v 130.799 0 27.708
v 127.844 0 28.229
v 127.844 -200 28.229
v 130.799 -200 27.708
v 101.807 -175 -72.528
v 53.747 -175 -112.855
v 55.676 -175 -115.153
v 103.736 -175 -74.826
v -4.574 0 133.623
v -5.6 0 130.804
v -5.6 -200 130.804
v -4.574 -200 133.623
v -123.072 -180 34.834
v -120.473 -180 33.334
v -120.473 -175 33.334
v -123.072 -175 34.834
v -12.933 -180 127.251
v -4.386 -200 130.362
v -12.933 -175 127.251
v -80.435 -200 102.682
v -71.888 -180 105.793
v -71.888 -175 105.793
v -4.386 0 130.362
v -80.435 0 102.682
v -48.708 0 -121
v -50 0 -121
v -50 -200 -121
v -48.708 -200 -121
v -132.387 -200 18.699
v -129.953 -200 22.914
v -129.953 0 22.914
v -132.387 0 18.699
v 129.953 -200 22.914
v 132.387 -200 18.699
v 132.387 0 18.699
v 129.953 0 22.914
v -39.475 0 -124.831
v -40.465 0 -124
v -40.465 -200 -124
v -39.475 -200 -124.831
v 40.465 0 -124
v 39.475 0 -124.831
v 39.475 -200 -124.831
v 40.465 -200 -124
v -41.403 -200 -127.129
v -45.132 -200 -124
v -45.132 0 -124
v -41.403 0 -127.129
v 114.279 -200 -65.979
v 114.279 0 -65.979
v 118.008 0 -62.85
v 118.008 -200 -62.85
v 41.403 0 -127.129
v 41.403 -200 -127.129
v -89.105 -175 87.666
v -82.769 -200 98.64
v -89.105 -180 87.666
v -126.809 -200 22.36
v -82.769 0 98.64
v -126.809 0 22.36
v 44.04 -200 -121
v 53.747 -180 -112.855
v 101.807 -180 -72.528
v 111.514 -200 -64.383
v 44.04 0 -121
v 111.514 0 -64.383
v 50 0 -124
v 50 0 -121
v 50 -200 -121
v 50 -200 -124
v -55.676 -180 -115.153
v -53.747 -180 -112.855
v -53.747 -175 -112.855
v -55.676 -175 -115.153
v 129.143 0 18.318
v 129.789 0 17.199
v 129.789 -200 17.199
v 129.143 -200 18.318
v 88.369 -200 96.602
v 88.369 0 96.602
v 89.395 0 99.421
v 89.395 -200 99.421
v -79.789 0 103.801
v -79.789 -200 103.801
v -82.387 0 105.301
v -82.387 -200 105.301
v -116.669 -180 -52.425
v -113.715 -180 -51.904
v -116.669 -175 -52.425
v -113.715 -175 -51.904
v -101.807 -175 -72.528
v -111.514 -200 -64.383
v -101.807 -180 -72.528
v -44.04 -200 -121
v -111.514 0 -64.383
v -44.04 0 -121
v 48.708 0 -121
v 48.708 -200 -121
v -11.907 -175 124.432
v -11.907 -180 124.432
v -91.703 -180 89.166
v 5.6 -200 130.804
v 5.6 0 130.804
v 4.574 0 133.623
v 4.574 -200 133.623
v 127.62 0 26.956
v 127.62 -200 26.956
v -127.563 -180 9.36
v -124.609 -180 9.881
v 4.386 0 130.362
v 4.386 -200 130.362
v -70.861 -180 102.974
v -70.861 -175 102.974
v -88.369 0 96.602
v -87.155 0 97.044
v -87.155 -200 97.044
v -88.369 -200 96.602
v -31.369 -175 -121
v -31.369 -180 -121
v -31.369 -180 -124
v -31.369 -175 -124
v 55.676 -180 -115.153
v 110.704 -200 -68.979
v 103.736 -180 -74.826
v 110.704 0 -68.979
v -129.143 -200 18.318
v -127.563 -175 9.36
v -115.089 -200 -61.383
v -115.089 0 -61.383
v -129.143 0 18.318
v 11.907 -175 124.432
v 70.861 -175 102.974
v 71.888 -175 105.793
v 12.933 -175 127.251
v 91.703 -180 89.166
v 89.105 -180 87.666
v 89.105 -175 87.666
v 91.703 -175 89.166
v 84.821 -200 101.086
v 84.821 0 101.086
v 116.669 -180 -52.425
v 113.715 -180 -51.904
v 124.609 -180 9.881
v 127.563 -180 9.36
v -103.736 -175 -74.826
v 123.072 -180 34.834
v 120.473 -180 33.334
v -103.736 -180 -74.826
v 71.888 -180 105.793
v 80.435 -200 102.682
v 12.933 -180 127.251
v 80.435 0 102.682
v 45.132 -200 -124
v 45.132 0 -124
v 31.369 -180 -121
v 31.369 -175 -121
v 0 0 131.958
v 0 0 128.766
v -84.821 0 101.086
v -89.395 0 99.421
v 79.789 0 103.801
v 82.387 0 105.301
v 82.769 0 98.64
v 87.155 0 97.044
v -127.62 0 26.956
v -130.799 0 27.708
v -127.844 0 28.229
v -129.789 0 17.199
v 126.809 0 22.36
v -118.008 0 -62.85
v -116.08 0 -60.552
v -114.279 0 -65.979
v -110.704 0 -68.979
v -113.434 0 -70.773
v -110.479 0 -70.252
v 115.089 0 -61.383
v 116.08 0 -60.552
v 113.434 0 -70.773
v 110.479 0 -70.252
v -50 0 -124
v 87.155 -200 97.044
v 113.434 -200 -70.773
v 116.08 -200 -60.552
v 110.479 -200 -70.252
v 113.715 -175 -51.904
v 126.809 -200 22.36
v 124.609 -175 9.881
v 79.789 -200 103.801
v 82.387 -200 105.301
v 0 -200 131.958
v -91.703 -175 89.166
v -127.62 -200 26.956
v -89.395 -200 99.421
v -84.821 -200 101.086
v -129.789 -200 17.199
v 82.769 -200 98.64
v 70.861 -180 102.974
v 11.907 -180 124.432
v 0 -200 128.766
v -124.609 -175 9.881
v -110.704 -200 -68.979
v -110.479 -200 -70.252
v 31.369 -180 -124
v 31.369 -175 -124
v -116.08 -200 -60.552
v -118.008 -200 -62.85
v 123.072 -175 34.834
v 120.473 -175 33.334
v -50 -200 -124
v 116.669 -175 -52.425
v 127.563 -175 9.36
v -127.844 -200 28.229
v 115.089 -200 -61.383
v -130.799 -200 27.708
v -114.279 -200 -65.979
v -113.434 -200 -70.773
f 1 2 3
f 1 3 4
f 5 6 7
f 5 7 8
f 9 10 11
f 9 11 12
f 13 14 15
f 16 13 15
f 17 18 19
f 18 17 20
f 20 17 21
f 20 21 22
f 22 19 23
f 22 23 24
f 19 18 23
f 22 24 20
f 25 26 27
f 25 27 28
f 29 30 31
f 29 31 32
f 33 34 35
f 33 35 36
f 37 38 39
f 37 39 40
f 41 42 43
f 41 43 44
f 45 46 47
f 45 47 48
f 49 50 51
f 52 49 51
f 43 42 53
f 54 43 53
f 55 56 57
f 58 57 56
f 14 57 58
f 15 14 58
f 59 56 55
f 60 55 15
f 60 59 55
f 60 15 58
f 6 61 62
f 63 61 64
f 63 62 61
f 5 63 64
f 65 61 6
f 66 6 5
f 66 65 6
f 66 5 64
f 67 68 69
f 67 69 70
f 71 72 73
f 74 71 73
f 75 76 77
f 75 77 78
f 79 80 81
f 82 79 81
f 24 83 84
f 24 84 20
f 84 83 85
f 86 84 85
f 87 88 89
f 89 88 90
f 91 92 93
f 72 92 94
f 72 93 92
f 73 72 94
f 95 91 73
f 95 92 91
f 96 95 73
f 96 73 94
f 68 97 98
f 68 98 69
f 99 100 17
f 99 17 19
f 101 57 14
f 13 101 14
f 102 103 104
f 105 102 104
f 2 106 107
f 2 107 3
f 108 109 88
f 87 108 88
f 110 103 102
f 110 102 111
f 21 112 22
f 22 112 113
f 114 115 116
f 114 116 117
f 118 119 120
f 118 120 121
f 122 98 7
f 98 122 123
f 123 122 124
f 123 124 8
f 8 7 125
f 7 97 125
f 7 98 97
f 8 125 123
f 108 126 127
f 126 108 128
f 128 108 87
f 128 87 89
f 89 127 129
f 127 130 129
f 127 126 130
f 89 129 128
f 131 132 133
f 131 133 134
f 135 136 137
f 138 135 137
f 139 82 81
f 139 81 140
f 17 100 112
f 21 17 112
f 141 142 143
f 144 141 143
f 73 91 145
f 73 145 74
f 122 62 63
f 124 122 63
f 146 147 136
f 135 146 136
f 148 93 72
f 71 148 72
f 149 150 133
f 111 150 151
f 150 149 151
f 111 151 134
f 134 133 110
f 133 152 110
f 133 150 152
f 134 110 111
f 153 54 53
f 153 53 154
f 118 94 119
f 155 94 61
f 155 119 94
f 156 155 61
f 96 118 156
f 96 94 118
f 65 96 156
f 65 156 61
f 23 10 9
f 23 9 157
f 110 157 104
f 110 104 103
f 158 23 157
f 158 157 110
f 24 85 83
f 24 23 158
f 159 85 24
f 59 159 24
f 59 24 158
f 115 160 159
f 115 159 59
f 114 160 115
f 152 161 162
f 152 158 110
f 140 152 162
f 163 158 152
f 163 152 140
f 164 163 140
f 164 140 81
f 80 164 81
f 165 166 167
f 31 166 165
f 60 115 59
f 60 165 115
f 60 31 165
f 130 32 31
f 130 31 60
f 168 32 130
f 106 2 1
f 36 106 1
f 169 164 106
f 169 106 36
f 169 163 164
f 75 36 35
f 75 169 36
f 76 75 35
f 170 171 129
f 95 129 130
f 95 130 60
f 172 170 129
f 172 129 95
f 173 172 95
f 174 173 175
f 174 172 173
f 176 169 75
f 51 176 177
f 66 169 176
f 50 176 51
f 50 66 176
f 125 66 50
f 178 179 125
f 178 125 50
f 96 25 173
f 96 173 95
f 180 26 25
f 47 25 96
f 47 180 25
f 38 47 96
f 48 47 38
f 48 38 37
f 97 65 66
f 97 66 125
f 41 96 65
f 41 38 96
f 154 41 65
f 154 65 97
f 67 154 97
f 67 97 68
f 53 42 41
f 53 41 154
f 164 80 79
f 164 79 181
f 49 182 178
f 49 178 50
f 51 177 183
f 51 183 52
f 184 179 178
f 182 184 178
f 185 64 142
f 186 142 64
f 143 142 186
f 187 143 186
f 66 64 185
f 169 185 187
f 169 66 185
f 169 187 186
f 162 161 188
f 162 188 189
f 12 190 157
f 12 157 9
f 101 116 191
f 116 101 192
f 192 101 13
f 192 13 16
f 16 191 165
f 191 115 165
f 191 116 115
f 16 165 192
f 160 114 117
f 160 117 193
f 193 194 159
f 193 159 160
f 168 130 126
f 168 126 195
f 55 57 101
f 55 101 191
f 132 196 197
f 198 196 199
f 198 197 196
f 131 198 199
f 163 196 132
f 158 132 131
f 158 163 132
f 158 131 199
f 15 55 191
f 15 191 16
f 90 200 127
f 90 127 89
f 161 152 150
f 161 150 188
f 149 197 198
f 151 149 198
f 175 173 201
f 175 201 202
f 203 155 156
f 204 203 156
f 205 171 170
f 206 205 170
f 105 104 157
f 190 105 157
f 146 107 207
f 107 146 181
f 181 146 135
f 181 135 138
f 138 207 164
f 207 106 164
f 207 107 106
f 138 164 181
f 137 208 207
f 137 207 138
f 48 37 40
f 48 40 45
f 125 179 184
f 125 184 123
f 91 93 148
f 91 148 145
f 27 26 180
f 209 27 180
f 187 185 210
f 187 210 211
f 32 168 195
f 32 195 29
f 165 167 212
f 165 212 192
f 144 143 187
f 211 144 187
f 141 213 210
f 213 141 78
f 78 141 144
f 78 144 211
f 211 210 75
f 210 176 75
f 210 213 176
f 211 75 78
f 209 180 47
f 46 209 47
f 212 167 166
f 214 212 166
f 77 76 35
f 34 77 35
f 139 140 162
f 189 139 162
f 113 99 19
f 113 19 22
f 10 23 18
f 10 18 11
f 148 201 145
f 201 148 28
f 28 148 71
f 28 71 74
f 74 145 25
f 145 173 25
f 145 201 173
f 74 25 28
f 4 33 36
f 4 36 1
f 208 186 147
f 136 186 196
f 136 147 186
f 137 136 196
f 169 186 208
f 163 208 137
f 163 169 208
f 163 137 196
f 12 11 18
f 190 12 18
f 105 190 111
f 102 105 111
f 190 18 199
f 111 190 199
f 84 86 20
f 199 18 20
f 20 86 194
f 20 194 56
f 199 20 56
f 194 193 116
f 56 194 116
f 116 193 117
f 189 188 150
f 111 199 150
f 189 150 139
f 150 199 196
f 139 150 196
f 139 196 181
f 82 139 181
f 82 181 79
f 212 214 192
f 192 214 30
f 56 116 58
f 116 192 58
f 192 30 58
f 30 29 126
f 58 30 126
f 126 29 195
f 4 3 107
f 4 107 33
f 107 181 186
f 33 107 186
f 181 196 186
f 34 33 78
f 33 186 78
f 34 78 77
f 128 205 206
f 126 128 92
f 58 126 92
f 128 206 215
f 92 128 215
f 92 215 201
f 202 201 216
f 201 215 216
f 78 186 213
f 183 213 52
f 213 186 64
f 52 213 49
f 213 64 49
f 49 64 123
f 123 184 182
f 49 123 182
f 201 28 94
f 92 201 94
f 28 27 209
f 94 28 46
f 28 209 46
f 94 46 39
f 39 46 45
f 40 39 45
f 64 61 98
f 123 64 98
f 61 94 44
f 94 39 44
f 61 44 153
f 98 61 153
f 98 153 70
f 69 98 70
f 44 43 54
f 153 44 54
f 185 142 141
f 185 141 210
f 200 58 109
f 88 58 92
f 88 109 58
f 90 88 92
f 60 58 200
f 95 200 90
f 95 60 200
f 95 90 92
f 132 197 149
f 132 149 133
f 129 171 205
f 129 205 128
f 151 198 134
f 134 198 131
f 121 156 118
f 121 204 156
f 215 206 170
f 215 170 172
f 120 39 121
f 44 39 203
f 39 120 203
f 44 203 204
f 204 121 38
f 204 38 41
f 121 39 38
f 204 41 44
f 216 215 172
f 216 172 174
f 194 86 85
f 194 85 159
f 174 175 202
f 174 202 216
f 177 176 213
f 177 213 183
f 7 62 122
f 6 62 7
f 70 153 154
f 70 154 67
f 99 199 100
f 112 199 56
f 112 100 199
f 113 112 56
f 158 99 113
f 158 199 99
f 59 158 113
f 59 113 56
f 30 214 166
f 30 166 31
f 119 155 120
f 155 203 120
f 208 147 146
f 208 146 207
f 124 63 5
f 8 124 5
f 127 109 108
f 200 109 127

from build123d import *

# Parameters (mm, degrees)
SKETCH_3_W               = 100
SKETCH_3_H               = 3
EXTRUDE_2_DEPTH          = 200
SKETCH_4_R               = 125
CUT_EXTRUDE_3_DEPTH      = 5
SKETCH_5_W               = 62.737548566
SKETCH_5_H               = 5
CUT_EXTRUDE_4_DEPTH      = 207.177108332
PATTERN_CIRCULAR_1_COUNT = 9


with BuildPart() as part:
    # 草圖3 → 填料-伸長2 (new body)
    with BuildSketch(Plane(origin=(0, 0, 0), x_dir=(1, 0, 0), z_dir=(0, 1, 0))):
        with Locations((0, 122.5)):
            Rectangle(SKETCH_3_W, SKETCH_3_H)
    extrude_2 = extrude(amount=-EXTRUDE_2_DEPTH)

    # 草圖4 → 除料-伸長3 (cut)
    with BuildSketch(Plane(origin=(0, -180, 0), x_dir=(-1, 0, 0), z_dir=(0, -1, 0))):
        Circle(SKETCH_4_R)
    extrude(amount=-CUT_EXTRUDE_3_DEPTH, mode=Mode.SUBTRACT)

    # 草圖5 → 除料-伸長4 (cut, through all)
    with BuildSketch(Plane.XY.offset(-121)):
        with Locations((0, -177.5)):
            Rectangle(SKETCH_5_W, SKETCH_5_H)
    cut_extrude_4 = extrude(amount=-CUT_EXTRUDE_4_DEPTH, mode=Mode.SUBTRACT)

    # 環狀複製排列1: 填料-伸長2, 除料-伸長4 ×9 about axis
    pattern_circular_1_axis = Axis((0, 0, 0), (0, 1, 0))
    add([extrude_2.rotate(pattern_circular_1_axis, i * 360 / PATTERN_CIRCULAR_1_COUNT) for i in range(1, PATTERN_CIRCULAR_1_COUNT)])
    add([cut_extrude_4.rotate(pattern_circular_1_axis, i * 360 / PATTERN_CIRCULAR_1_COUNT) for i in range(1, PATTERN_CIRCULAR_1_COUNT)], mode=Mode.SUBTRACT)


solid = part.part
